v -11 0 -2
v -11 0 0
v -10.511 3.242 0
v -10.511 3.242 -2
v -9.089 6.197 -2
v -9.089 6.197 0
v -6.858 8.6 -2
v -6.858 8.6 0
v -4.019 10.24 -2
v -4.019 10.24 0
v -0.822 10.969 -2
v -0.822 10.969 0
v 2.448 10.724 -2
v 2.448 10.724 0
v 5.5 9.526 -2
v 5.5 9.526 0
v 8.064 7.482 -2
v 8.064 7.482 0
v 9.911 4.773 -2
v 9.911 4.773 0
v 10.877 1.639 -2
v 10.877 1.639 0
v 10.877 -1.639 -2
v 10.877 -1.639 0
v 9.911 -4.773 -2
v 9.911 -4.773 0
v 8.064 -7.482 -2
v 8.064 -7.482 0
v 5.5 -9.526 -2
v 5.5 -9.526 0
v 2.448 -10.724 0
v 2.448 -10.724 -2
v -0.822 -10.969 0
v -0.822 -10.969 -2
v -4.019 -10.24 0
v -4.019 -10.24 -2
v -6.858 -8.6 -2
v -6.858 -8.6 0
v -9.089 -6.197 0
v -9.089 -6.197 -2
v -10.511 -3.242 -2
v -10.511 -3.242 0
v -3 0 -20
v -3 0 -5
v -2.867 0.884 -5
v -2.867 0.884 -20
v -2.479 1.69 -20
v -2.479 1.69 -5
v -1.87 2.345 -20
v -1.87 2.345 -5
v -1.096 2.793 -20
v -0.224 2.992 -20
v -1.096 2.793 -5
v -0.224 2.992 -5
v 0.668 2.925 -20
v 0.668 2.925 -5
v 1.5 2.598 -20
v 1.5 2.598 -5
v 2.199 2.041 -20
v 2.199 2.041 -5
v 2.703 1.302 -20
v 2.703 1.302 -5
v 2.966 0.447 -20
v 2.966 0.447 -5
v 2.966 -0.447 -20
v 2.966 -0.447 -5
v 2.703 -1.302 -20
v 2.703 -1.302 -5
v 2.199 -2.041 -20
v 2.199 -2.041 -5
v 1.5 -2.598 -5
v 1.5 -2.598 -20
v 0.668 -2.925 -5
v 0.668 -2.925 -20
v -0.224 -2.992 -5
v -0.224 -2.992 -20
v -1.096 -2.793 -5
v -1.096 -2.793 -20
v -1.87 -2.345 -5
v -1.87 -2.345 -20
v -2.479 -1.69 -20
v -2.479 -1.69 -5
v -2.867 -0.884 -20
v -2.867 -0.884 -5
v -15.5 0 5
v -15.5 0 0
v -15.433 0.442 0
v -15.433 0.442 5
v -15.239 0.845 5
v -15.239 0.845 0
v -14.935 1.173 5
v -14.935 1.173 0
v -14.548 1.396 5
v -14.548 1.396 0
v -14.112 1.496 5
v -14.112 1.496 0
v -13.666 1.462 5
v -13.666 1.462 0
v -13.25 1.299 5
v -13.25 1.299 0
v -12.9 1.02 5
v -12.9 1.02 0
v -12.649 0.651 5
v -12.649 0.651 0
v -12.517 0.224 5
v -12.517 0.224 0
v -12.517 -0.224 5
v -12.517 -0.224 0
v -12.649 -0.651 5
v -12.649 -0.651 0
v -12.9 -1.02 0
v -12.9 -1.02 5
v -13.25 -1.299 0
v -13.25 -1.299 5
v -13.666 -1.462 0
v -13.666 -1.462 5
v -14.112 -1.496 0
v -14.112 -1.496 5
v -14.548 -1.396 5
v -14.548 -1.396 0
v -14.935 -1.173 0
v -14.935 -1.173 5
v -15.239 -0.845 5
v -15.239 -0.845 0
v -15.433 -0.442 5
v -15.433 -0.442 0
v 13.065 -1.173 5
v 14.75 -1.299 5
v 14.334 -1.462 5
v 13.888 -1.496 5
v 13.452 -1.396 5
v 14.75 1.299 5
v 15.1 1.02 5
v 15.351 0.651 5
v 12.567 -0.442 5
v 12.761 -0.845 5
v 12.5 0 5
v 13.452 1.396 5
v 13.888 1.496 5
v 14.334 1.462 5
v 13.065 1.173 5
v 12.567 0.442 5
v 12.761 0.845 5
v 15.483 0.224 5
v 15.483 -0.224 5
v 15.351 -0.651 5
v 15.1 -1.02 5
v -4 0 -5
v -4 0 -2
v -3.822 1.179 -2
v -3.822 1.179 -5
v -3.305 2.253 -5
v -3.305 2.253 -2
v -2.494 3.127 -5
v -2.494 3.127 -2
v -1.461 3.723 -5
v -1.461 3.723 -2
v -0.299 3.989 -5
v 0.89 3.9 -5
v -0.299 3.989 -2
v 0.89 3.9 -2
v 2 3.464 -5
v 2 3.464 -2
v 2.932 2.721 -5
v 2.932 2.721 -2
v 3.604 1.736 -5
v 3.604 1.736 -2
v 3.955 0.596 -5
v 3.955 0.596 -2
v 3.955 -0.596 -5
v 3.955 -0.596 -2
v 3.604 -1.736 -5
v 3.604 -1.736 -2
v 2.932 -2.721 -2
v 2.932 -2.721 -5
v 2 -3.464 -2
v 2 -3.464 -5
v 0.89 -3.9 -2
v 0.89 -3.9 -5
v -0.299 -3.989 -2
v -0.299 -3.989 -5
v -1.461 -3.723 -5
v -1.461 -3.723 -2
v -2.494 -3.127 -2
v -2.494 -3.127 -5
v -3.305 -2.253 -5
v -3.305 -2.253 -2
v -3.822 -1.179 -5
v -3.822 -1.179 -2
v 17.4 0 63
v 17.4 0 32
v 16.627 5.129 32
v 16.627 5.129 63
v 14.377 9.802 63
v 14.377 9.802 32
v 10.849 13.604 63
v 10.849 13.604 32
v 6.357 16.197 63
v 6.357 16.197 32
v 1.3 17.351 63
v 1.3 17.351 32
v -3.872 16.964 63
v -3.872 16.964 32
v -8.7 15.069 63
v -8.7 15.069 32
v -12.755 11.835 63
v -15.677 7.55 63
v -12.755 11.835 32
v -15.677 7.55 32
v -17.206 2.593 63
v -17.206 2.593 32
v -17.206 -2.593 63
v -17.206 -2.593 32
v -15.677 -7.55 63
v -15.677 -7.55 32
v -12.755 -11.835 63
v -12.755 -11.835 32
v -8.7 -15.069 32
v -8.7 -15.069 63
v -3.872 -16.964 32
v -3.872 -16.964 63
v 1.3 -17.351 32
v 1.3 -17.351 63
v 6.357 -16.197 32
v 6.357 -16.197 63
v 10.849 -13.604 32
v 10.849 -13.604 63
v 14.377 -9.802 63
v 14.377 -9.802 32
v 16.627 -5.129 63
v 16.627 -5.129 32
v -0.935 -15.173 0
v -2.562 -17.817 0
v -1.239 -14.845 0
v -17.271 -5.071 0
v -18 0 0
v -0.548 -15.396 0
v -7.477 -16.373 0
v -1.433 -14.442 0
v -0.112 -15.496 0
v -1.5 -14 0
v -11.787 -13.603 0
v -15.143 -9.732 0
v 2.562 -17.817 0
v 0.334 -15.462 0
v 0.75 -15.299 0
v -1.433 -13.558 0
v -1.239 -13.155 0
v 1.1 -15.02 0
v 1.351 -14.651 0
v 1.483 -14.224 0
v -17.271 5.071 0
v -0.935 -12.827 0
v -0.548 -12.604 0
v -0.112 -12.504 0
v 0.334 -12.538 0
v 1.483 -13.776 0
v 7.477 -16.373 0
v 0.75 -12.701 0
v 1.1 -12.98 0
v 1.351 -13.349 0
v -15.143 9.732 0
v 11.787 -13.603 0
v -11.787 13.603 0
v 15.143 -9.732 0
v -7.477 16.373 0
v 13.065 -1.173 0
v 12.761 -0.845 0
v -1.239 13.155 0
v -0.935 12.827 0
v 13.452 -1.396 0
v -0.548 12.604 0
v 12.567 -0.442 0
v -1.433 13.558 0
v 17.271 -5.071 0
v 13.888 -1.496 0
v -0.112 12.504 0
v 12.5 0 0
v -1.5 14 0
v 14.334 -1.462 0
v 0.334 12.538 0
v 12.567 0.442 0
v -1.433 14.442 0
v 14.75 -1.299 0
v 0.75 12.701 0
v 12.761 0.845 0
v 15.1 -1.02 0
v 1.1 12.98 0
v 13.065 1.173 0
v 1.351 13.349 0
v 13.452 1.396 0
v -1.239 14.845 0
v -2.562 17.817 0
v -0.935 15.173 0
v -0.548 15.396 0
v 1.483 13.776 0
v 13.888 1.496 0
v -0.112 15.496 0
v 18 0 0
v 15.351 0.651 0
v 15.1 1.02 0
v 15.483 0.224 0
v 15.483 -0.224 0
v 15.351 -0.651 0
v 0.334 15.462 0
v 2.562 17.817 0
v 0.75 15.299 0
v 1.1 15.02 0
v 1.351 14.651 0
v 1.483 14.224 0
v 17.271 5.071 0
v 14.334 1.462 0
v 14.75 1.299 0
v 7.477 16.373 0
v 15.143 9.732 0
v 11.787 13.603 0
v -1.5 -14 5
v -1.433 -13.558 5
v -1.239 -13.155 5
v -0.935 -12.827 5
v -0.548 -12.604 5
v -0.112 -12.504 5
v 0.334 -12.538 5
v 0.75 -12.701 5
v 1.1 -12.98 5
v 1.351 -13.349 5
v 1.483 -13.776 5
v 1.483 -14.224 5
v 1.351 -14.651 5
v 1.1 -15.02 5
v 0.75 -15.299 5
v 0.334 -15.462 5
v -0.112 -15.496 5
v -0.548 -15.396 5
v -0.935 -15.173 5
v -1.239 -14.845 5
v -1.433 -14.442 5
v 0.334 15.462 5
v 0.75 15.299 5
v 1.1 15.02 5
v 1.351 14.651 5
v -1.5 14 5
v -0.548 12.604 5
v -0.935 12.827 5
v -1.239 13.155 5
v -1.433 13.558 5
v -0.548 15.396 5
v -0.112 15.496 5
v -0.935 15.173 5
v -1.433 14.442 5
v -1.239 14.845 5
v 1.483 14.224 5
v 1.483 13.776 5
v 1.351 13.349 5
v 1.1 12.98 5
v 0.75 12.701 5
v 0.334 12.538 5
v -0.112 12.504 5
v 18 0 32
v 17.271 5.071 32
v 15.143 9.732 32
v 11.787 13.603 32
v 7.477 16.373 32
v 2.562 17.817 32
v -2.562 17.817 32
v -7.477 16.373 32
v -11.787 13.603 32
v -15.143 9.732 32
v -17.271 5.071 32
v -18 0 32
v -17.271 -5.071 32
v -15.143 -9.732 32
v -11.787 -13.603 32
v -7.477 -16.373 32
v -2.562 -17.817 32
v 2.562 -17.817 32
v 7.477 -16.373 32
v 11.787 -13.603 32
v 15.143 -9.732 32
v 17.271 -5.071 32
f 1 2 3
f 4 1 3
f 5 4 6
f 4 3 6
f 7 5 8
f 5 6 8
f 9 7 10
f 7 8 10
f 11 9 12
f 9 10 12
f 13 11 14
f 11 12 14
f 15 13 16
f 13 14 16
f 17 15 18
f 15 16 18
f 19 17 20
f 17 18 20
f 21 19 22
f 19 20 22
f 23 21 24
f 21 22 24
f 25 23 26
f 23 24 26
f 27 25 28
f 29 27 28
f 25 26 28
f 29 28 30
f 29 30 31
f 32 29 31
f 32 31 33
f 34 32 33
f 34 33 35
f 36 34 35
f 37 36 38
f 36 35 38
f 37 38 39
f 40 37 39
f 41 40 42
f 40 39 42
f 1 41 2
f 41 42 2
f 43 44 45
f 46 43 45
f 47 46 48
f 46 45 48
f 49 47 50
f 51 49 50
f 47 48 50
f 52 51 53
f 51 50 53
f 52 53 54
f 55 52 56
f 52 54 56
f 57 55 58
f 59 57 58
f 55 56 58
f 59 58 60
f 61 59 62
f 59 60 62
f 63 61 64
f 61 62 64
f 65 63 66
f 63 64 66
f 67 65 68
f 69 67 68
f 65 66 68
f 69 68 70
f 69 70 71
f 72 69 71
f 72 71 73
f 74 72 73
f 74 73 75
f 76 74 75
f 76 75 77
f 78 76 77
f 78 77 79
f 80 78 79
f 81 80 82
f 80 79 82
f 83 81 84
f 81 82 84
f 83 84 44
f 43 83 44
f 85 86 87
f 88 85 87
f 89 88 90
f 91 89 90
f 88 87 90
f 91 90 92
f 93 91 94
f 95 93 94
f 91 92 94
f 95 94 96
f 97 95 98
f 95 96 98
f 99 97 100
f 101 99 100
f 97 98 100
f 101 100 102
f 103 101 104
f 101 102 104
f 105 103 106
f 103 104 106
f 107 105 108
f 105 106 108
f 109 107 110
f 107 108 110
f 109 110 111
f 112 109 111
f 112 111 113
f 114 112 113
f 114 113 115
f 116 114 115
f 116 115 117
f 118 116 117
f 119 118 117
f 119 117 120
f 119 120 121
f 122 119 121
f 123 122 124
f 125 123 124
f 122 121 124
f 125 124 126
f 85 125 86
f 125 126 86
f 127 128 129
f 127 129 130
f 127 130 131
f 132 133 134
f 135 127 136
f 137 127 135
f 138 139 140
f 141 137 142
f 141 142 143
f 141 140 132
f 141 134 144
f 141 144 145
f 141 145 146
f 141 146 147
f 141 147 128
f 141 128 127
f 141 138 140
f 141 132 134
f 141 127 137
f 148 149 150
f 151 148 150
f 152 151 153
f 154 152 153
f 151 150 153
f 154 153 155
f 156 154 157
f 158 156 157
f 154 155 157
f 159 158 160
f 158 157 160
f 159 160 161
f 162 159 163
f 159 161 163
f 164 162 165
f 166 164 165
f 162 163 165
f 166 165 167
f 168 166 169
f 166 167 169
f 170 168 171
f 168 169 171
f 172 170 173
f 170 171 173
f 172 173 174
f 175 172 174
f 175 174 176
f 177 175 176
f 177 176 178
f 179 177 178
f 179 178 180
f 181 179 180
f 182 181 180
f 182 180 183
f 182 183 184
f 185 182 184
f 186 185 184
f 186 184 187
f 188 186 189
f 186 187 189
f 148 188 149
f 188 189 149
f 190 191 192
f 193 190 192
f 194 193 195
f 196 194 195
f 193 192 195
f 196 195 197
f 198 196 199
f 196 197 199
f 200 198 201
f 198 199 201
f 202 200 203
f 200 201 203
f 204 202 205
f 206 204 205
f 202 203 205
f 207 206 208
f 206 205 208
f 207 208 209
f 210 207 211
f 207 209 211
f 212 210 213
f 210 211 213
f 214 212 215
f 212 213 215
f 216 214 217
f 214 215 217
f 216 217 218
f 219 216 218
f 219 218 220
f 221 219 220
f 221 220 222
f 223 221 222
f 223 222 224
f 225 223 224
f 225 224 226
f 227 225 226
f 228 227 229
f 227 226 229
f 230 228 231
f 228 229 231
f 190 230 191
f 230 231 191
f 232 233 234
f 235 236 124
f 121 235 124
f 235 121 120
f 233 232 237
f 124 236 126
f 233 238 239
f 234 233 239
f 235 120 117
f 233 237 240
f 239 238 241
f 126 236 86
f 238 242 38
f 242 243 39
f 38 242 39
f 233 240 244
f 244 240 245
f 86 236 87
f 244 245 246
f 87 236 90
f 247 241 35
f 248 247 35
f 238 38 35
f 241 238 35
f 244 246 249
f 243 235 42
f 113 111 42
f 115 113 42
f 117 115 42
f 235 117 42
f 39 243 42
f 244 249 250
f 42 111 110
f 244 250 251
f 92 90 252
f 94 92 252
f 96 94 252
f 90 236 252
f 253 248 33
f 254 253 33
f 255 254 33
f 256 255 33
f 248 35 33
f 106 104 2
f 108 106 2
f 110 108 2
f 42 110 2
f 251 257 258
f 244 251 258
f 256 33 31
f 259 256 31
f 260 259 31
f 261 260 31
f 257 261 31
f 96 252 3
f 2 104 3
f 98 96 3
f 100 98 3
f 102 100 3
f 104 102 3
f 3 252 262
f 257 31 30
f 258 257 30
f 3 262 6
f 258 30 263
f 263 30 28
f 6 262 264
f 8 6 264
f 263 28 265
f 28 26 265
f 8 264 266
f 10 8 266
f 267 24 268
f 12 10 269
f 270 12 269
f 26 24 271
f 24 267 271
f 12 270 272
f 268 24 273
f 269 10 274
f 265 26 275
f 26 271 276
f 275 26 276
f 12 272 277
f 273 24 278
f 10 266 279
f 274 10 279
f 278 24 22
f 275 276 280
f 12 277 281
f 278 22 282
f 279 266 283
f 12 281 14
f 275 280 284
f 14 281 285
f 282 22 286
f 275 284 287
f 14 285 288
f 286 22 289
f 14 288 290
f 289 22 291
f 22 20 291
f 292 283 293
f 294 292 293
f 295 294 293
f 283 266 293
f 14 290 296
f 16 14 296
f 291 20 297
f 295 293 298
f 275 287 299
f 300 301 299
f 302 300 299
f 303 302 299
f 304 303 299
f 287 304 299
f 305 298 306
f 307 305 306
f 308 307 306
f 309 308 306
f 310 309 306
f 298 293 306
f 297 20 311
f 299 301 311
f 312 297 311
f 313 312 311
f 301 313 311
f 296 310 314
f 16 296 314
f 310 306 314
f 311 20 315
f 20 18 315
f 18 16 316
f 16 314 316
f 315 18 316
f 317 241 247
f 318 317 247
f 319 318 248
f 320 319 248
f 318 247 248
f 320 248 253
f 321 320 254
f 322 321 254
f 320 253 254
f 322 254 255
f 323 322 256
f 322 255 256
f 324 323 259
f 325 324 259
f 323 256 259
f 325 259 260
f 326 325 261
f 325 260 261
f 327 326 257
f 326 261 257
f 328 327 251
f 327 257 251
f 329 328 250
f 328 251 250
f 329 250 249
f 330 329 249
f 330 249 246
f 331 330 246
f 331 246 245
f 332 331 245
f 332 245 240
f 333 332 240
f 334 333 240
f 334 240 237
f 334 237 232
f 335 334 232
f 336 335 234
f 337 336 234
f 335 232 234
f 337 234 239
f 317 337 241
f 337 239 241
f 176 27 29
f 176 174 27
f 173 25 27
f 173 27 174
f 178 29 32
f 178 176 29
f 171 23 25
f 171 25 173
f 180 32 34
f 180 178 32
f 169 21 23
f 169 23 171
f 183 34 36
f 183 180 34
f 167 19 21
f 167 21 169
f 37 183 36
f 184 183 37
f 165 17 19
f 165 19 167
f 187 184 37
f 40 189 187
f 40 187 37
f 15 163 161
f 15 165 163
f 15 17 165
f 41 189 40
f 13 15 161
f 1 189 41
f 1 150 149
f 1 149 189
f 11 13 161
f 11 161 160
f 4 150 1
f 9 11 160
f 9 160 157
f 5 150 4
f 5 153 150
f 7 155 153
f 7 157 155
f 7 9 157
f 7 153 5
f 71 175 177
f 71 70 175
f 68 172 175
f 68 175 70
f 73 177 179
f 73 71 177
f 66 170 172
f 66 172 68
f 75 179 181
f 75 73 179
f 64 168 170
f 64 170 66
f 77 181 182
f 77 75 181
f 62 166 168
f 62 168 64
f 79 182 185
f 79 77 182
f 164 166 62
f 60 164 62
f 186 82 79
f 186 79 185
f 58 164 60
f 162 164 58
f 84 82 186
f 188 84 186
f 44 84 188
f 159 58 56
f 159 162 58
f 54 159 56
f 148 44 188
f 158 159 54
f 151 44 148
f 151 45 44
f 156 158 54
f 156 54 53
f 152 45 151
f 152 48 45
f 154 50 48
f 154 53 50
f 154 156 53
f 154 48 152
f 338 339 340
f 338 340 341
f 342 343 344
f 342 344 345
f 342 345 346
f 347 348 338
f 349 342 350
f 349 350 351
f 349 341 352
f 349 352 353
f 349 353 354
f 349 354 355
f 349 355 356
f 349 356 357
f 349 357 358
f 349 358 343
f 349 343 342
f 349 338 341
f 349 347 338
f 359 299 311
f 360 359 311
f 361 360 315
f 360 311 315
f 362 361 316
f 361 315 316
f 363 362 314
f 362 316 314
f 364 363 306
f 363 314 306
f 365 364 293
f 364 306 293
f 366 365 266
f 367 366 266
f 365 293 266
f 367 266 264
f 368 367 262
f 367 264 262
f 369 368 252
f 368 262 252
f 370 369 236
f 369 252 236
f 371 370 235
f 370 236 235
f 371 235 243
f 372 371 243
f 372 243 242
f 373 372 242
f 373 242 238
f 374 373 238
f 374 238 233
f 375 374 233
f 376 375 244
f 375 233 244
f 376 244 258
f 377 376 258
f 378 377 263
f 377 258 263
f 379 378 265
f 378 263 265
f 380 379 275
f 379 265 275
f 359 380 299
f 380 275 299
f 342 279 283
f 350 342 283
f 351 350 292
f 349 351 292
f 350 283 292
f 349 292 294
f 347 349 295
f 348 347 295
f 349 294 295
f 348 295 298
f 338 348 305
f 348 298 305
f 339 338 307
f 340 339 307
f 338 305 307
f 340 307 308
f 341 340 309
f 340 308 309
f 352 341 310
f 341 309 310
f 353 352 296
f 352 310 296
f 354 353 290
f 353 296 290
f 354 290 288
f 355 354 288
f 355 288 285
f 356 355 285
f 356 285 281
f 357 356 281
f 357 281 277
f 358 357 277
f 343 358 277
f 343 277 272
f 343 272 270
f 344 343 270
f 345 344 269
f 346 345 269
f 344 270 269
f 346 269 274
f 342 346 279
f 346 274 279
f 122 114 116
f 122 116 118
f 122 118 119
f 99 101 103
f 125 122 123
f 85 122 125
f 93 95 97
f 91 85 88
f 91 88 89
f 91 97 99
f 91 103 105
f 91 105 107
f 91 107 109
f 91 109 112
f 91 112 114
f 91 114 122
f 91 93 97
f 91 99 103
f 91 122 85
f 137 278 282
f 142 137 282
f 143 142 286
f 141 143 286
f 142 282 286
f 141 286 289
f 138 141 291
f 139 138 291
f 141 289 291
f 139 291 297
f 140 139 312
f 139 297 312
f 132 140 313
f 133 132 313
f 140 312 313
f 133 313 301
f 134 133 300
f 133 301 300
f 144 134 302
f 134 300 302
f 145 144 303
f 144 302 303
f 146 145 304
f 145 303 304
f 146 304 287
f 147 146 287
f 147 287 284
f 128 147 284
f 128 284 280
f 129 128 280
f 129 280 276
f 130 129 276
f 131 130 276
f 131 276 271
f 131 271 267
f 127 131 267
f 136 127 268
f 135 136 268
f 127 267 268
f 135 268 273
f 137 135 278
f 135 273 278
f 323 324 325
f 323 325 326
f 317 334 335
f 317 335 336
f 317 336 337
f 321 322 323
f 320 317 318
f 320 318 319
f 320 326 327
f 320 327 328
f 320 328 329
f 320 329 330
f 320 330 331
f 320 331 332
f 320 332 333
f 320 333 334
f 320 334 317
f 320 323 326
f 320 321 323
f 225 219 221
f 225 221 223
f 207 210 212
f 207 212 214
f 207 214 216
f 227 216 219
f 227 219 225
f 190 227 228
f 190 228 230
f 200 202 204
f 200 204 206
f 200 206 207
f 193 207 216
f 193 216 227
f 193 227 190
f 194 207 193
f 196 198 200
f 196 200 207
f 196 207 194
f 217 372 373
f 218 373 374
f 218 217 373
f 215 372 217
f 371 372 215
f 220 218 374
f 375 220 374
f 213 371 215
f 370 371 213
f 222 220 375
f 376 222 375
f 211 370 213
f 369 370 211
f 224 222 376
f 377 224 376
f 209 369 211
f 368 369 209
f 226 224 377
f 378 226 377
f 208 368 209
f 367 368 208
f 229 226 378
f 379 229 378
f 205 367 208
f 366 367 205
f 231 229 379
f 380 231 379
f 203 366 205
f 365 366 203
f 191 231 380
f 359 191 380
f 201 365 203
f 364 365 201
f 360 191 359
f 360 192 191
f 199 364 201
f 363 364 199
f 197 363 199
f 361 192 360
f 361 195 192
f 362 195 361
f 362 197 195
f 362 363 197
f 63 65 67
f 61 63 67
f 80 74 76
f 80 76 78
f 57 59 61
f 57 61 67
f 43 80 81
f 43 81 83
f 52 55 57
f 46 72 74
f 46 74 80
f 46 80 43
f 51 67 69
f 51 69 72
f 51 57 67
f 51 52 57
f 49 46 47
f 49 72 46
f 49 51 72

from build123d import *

# Parameters (mm, degrees)
SKETCH_1_R          = 18
EXTRUDE_1_DEPTH     = 32
SKETCH_2_R          = 17.4
EXTRUDE_2_DEPTH     = 31
SKETCH_3_R          = 11
EXTRUDE_3_DEPTH     = 2
SKETCH_4_R          = 4
EXTRUDE_4_DEPTH     = 3
SKETCH_5_R          = 3
EXTRUDE_5_DEPTH     = 15
SKETCH_6_R          = 1.5
CUT_EXTRUDE_2_DEPTH = 5


with BuildPart() as part:
    # 草图1 → 凸台-拉伸1 (new body)
    with BuildSketch(Plane.XY):
        Circle(SKETCH_1_R)
    extrude(amount=EXTRUDE_1_DEPTH)

    # 草图2 → 凸台-拉伸2 (add)
    with BuildSketch(Plane.XY.offset(32)):
        Circle(SKETCH_2_R)
    extrude(amount=EXTRUDE_2_DEPTH)

    # 草图3 → 凸台-拉伸3 (add)
    with BuildSketch(Plane(origin=(0, 0, 0), x_dir=(-1, 0, 0), z_dir=(0, 0, -1))):
        Circle(SKETCH_3_R)
    extrude(amount=EXTRUDE_3_DEPTH)

    # 草图4 → 凸台-拉伸4 (add)
    with BuildSketch(Plane(origin=(0, 0, -2), x_dir=(-1, 0, 0), z_dir=(0, 0, -1))):
        Circle(SKETCH_4_R)
    extrude(amount=EXTRUDE_4_DEPTH)

    # 草图5 → 凸台-拉伸5 (add)
    with BuildSketch(Plane(origin=(0, 0, -5), x_dir=(-1, 0, 0), z_dir=(0, 0, -1))):
        Circle(SKETCH_5_R)
    extrude(amount=EXTRUDE_5_DEPTH)

    # 草图6 → 切除-拉伸2 (cut)
    with BuildSketch(Plane(origin=(0, 0, 0), x_dir=(-1, 0, 0), z_dir=(0, 0, -1))):
        with Locations((0, 14)):
            Circle(SKETCH_6_R)
        with Locations((0, -14)):
            Circle(SKETCH_6_R)
        with Locations((14, 0)):
            Circle(SKETCH_6_R)
        with Locations((-14, 0)):
            Circle(SKETCH_6_R)
    extrude(amount=-CUT_EXTRUDE_2_DEPTH, mode=Mode.SUBTRACT)


solid = part.part
